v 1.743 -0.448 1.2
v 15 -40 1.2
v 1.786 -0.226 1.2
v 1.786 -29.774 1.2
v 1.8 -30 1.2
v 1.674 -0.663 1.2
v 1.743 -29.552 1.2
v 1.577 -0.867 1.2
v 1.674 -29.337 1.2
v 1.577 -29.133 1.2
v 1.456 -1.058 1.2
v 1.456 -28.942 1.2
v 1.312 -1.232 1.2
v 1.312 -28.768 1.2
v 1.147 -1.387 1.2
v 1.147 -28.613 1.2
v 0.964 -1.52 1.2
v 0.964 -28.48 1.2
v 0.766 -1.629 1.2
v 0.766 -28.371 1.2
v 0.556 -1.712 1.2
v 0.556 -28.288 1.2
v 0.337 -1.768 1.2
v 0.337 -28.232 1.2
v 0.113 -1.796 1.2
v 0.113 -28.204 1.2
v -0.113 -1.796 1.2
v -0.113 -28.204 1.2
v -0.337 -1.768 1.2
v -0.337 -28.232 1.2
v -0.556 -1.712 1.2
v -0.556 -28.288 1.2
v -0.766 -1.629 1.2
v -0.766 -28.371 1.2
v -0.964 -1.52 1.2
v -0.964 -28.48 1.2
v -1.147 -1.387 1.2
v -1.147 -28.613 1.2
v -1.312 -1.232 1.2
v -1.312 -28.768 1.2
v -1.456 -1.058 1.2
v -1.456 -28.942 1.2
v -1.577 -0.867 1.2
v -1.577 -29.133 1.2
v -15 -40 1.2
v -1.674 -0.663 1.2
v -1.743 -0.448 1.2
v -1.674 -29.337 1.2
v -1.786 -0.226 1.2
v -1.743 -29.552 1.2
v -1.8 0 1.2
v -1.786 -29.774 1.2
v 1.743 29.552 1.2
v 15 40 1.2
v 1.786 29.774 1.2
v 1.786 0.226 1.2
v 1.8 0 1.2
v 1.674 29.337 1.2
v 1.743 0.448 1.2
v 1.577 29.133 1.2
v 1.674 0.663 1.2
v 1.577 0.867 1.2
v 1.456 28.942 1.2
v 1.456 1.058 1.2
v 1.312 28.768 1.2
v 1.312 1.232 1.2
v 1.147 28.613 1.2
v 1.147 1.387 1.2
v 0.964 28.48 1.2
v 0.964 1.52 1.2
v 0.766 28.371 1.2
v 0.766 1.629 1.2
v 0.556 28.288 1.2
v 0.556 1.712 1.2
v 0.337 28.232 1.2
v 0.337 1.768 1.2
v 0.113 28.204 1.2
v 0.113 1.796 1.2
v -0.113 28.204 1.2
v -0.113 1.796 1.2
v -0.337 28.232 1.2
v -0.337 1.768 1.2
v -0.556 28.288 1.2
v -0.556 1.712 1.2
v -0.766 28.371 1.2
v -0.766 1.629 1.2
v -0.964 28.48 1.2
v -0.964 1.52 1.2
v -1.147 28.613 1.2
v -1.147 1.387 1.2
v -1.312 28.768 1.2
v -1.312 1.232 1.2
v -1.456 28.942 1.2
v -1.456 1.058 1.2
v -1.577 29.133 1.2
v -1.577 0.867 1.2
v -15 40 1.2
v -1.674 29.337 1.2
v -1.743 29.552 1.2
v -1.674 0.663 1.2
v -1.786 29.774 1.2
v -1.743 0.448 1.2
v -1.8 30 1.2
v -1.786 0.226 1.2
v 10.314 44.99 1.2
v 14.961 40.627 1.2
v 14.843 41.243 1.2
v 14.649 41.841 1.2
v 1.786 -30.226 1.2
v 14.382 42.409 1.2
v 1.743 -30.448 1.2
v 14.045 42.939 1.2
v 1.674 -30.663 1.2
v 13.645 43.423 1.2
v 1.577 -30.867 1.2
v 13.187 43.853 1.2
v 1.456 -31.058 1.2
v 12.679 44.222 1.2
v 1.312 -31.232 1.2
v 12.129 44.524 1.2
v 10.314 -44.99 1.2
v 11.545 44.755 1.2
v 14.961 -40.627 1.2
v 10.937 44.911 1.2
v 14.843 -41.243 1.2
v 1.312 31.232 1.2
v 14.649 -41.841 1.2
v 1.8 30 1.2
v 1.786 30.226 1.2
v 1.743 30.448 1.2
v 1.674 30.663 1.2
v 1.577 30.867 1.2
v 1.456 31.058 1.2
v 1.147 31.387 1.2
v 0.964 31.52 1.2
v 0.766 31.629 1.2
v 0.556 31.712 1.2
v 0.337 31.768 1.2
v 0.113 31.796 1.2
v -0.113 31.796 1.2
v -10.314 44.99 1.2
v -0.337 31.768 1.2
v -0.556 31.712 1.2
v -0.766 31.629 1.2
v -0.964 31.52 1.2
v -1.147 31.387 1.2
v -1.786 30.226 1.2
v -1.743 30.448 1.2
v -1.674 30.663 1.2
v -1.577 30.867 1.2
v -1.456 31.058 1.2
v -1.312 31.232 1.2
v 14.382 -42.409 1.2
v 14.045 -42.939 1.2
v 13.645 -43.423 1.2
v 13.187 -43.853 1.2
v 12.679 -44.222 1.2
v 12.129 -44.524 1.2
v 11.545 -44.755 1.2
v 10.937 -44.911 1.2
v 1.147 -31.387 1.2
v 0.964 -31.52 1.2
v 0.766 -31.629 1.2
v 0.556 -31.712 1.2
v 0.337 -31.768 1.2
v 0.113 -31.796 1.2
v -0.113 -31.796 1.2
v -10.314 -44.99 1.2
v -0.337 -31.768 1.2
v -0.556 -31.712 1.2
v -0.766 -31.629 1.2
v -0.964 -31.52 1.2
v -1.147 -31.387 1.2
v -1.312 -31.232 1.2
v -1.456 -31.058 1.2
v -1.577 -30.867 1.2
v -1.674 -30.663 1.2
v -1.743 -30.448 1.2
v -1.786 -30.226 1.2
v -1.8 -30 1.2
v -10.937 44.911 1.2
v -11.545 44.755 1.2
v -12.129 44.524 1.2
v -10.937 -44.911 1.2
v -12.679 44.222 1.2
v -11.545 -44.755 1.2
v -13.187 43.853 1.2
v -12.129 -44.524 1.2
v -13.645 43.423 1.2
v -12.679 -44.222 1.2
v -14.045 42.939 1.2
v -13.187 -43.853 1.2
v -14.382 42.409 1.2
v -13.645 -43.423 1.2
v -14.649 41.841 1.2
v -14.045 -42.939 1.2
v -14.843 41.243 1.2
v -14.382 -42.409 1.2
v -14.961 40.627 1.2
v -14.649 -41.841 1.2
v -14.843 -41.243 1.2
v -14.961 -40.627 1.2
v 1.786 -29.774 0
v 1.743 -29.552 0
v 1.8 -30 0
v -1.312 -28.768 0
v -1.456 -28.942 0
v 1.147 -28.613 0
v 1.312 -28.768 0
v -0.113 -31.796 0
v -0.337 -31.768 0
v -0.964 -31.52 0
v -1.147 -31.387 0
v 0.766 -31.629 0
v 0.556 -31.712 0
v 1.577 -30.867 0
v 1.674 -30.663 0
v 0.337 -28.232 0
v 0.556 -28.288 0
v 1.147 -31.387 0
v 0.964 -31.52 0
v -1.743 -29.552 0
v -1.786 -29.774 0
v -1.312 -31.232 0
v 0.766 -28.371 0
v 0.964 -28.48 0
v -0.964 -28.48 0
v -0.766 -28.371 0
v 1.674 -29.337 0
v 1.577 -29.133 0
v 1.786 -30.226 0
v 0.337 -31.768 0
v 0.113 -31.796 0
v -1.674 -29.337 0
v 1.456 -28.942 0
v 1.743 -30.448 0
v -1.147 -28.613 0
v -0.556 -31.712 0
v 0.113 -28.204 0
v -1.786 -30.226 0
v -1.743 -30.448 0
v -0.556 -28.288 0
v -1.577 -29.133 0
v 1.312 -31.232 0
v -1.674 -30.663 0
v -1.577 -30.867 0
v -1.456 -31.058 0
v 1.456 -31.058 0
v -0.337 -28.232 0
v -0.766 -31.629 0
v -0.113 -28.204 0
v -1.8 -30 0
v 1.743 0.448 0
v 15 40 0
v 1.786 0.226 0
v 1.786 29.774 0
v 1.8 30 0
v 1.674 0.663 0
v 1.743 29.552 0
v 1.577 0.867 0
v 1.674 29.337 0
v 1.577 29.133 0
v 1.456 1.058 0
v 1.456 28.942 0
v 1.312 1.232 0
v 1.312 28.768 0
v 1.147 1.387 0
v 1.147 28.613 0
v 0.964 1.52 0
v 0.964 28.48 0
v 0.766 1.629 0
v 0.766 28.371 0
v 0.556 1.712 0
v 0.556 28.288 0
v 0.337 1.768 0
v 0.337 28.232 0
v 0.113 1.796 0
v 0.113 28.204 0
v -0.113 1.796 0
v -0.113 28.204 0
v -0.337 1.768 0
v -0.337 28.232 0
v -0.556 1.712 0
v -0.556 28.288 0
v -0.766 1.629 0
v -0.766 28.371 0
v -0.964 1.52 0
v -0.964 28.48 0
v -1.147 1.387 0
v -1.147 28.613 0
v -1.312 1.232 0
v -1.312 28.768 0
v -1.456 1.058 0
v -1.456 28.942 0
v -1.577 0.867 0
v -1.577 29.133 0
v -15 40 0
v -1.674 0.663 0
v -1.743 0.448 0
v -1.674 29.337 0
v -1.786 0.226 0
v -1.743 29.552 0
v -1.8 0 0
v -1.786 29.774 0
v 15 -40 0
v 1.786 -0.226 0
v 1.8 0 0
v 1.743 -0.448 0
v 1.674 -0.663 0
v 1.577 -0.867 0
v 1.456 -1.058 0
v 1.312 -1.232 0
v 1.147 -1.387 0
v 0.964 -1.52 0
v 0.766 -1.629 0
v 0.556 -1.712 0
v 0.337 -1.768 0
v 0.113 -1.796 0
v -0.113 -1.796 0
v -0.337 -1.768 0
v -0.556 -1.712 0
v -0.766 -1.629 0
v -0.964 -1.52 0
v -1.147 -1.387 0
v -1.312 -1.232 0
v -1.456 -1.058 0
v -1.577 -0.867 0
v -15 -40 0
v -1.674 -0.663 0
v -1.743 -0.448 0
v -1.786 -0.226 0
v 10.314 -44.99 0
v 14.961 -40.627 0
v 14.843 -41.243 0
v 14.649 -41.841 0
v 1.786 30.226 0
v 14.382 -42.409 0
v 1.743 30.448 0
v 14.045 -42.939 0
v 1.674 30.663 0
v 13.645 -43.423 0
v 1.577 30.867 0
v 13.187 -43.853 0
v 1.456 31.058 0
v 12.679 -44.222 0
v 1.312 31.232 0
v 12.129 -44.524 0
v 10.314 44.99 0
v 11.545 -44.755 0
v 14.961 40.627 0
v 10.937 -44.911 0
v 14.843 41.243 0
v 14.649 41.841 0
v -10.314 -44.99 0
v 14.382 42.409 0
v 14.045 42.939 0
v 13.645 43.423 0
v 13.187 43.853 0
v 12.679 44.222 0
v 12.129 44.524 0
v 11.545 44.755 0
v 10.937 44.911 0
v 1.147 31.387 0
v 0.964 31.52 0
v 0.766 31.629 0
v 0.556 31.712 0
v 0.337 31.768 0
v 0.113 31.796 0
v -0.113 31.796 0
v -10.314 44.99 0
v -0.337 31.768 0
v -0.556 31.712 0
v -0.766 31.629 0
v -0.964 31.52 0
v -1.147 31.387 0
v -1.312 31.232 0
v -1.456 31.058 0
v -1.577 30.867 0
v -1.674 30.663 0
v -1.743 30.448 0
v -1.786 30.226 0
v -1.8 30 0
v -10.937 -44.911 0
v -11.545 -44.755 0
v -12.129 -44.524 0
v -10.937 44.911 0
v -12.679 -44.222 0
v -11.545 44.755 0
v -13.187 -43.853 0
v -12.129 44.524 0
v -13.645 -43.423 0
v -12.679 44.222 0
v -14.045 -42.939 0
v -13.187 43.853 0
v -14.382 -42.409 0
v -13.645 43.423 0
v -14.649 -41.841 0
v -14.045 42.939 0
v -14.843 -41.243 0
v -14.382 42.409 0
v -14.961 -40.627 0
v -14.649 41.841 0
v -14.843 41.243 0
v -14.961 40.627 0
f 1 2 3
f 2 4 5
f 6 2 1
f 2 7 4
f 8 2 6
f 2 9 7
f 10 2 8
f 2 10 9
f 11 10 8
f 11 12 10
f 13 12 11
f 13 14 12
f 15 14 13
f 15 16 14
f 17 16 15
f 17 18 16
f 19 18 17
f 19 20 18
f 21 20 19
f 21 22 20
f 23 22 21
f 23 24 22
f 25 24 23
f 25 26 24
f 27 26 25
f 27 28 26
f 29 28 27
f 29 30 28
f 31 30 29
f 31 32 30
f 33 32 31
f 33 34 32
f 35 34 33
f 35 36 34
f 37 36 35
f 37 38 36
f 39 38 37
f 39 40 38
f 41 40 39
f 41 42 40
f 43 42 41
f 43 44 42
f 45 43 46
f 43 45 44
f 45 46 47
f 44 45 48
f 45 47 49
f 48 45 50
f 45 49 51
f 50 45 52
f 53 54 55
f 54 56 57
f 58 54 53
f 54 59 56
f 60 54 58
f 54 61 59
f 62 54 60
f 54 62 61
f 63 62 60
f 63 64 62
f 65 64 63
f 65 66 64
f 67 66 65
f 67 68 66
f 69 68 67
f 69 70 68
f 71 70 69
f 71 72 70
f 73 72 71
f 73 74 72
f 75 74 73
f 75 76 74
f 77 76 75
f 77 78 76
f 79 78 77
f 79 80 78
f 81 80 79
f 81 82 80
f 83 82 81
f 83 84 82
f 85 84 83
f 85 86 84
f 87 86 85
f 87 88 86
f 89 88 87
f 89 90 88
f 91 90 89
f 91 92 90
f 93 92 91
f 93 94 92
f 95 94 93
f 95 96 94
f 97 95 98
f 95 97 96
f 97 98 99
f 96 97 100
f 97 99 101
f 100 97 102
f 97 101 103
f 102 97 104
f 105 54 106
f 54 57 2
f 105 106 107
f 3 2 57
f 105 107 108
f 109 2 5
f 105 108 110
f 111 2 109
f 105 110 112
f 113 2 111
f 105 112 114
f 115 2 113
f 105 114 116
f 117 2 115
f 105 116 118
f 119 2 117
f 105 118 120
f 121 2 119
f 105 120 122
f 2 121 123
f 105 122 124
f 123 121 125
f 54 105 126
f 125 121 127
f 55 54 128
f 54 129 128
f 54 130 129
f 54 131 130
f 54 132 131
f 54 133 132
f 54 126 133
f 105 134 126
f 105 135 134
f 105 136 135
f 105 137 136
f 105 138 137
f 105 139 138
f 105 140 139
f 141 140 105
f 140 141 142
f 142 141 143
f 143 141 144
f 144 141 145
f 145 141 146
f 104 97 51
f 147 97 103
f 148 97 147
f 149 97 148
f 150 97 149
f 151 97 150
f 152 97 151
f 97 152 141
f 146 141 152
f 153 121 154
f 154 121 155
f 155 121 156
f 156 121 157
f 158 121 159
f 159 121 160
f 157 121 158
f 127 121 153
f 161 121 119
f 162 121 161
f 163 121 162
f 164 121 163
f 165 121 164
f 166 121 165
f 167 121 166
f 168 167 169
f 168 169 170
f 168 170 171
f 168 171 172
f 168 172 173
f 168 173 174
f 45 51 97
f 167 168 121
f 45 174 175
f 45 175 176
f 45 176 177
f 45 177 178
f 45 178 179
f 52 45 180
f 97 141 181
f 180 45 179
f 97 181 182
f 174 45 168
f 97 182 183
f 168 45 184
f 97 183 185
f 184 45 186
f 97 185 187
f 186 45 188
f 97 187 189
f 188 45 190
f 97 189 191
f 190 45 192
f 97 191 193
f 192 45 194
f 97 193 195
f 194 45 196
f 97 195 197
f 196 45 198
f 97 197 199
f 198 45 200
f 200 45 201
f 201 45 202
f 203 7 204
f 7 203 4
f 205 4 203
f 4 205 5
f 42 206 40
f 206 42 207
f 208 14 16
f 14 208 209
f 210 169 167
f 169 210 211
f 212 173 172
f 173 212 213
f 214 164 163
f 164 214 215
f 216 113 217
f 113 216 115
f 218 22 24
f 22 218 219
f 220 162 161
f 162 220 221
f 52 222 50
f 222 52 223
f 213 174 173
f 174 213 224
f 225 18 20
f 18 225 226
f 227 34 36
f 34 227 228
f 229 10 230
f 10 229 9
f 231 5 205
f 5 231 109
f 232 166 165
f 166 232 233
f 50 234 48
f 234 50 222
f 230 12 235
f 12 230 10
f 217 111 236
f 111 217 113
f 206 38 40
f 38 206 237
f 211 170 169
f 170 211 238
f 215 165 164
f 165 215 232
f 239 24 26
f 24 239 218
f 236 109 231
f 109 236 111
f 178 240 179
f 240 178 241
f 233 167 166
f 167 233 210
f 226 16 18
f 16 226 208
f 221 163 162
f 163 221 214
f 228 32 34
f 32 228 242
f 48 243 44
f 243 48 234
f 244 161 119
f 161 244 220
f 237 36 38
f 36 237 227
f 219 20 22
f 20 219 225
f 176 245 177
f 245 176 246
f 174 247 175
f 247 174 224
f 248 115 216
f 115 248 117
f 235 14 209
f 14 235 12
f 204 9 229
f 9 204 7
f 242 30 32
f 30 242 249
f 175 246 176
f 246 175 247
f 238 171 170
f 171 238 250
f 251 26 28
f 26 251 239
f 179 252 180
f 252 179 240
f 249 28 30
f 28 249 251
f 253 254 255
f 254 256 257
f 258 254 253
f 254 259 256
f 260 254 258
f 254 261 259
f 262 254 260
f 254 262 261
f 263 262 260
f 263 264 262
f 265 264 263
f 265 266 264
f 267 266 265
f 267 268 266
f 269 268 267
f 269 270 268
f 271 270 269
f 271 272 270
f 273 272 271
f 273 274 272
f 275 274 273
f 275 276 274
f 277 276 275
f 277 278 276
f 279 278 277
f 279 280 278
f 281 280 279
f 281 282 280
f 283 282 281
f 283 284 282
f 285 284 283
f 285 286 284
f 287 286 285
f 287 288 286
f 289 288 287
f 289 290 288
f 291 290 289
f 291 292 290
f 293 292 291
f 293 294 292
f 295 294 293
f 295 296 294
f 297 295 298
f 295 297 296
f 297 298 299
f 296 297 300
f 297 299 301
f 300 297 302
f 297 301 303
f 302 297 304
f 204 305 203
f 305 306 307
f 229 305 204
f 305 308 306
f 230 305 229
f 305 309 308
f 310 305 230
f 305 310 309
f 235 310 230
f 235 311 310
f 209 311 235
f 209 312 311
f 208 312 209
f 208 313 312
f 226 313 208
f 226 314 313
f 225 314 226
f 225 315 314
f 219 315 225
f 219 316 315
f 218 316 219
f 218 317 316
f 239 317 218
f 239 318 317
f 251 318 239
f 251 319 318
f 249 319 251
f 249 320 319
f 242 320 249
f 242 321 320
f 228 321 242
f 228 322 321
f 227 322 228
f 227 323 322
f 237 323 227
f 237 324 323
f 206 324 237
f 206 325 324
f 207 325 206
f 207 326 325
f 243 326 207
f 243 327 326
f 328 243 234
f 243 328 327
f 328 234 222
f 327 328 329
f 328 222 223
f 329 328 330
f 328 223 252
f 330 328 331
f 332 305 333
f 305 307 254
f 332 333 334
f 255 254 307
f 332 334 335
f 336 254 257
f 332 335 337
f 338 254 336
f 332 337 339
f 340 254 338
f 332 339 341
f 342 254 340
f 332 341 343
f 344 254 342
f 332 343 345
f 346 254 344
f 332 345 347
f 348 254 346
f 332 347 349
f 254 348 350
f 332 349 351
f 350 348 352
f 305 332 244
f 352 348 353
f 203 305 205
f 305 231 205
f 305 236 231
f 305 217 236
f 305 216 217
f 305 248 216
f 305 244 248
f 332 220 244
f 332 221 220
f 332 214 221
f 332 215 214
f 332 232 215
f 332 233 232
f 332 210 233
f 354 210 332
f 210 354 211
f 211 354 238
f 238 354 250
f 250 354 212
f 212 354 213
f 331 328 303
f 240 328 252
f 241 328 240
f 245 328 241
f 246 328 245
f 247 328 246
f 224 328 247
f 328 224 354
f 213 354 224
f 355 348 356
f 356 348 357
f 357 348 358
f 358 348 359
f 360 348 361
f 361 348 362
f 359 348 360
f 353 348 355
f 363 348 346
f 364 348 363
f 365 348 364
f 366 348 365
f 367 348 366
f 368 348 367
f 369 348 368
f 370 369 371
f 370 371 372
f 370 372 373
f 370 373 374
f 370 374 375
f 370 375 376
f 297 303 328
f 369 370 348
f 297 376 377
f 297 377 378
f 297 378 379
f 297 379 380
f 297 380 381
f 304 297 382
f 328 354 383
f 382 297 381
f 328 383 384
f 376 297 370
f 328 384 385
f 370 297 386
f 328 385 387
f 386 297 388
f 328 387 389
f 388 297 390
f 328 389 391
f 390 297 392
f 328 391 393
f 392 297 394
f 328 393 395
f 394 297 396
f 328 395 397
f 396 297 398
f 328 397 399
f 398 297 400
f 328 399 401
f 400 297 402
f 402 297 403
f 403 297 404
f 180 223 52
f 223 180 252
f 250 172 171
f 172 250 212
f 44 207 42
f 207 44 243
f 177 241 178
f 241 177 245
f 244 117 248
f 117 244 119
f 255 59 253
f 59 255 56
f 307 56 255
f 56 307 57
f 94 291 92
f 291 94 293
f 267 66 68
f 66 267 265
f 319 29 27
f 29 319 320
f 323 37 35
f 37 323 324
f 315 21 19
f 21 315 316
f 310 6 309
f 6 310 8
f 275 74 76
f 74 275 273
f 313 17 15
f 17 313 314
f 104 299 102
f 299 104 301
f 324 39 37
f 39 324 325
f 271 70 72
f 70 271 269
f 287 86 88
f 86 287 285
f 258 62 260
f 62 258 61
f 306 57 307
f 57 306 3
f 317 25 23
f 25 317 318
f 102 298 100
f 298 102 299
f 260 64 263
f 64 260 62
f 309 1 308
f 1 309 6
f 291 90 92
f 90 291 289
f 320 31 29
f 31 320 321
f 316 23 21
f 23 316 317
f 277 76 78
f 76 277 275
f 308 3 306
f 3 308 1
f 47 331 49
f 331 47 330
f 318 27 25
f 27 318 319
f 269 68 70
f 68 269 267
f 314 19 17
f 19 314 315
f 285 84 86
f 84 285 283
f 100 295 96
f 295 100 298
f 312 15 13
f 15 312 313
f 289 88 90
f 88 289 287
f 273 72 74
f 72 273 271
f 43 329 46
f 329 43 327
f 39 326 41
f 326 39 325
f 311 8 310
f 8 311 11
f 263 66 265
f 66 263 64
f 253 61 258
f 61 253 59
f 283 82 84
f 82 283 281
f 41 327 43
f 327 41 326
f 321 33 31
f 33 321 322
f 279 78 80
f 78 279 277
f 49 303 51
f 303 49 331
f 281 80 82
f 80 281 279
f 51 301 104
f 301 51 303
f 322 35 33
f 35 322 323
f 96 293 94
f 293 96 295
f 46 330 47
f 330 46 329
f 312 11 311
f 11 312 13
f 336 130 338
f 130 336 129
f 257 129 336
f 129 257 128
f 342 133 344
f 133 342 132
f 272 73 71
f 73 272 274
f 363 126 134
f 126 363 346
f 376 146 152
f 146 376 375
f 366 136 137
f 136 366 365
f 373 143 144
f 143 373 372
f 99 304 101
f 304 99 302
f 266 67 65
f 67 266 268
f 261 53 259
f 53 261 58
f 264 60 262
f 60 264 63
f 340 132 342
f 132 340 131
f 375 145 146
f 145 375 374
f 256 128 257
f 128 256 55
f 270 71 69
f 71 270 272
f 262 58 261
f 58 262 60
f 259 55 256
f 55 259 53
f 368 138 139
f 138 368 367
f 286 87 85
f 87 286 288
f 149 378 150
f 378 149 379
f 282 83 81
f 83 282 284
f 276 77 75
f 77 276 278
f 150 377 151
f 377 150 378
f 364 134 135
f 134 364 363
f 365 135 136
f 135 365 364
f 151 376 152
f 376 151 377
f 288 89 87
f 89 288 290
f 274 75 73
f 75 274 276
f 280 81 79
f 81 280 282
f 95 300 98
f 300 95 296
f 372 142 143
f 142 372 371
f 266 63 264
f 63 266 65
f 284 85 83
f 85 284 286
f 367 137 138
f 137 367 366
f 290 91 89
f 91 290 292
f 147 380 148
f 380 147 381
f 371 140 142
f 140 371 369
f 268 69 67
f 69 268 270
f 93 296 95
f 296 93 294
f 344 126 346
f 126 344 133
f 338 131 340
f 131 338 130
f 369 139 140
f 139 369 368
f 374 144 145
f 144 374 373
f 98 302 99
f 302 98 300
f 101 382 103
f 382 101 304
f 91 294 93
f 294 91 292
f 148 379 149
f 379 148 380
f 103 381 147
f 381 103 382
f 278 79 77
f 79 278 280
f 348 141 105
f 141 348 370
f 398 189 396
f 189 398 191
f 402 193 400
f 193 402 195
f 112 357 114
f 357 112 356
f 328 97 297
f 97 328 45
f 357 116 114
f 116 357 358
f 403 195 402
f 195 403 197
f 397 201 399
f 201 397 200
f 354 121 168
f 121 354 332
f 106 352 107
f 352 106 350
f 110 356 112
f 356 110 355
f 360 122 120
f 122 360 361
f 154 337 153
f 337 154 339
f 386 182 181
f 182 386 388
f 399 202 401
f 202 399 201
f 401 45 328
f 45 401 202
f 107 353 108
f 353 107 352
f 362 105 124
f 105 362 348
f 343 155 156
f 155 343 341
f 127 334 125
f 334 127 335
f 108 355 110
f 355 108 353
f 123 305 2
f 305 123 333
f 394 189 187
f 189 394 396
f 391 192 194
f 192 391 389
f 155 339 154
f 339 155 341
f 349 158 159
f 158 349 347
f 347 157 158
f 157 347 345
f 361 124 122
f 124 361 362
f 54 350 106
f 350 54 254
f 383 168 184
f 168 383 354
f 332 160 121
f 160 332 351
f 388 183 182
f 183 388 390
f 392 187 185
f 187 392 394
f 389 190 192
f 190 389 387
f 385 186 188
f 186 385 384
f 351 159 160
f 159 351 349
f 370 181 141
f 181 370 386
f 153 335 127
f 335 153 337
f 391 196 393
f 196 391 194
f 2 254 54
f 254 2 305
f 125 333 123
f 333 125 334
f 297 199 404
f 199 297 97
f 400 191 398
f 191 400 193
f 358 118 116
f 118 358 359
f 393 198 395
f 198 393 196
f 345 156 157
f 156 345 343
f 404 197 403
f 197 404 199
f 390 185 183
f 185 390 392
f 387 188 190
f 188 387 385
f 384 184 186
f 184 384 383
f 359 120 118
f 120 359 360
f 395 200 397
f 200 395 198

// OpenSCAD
$fn = 50;


difference() {
	union() {
		hull() {
			translate(v = [-10.0000000000, 40.0000000000, 0]) {
				cylinder(h = 15, r = 5);
			}
			translate(v = [10.0000000000, 40.0000000000, 0]) {
				cylinder(h = 15, r = 5);
			}
			translate(v = [-10.0000000000, -40.0000000000, 0]) {
				cylinder(h = 15, r = 5);
			}
			translate(v = [10.0000000000, -40.0000000000, 0]) {
				cylinder(h = 15, r = 5);
			}
		}
	}
	union() {
		translate(v = [0, 0, 1.2000000000]) {
			hull() {
				translate(v = [-10.0000000000, 40.0000000000, 0]) {
					cylinder(h = 13.8000000000, r = 3.8000000000);
				}
				translate(v = [10.0000000000, 40.0000000000, 0]) {
					cylinder(h = 13.8000000000, r = 3.8000000000);
				}
				translate(v = [-10.0000000000, -40.0000000000, 0]) {
					cylinder(h = 13.8000000000, r = 3.8000000000);
				}
				translate(v = [10.0000000000, -40.0000000000, 0]) {
					cylinder(h = 13.8000000000, r = 3.8000000000);
				}
			}
		}
		#translate(v = [0.0000000000, -30.0000000000, 0]) {
			cylinder(h = 1.2000000000, r = 1.8000000000);
		}
		#cylinder(h = 1.2000000000, r = 1.8000000000);
		#translate(v = [0.0000000000, 30.0000000000, 0]) {
			cylinder(h = 1.2000000000, r = 1.8000000000);
		}
		translate(v = [-250.0000000000, -250.0000000000, 1.2000000000]) {
			cube(size = [500, 500, 500]);
		}
		translate(v = [-250.0000000000, -250.0000000000, 1.2000000000]) {
			cube(size = [500, 500, 500]);
		}
		translate(v = [-250.0000000000, -250.0000000000, 1.2000000000]) {
			cube(size = [500, 500, 500]);
		}
	}
}
